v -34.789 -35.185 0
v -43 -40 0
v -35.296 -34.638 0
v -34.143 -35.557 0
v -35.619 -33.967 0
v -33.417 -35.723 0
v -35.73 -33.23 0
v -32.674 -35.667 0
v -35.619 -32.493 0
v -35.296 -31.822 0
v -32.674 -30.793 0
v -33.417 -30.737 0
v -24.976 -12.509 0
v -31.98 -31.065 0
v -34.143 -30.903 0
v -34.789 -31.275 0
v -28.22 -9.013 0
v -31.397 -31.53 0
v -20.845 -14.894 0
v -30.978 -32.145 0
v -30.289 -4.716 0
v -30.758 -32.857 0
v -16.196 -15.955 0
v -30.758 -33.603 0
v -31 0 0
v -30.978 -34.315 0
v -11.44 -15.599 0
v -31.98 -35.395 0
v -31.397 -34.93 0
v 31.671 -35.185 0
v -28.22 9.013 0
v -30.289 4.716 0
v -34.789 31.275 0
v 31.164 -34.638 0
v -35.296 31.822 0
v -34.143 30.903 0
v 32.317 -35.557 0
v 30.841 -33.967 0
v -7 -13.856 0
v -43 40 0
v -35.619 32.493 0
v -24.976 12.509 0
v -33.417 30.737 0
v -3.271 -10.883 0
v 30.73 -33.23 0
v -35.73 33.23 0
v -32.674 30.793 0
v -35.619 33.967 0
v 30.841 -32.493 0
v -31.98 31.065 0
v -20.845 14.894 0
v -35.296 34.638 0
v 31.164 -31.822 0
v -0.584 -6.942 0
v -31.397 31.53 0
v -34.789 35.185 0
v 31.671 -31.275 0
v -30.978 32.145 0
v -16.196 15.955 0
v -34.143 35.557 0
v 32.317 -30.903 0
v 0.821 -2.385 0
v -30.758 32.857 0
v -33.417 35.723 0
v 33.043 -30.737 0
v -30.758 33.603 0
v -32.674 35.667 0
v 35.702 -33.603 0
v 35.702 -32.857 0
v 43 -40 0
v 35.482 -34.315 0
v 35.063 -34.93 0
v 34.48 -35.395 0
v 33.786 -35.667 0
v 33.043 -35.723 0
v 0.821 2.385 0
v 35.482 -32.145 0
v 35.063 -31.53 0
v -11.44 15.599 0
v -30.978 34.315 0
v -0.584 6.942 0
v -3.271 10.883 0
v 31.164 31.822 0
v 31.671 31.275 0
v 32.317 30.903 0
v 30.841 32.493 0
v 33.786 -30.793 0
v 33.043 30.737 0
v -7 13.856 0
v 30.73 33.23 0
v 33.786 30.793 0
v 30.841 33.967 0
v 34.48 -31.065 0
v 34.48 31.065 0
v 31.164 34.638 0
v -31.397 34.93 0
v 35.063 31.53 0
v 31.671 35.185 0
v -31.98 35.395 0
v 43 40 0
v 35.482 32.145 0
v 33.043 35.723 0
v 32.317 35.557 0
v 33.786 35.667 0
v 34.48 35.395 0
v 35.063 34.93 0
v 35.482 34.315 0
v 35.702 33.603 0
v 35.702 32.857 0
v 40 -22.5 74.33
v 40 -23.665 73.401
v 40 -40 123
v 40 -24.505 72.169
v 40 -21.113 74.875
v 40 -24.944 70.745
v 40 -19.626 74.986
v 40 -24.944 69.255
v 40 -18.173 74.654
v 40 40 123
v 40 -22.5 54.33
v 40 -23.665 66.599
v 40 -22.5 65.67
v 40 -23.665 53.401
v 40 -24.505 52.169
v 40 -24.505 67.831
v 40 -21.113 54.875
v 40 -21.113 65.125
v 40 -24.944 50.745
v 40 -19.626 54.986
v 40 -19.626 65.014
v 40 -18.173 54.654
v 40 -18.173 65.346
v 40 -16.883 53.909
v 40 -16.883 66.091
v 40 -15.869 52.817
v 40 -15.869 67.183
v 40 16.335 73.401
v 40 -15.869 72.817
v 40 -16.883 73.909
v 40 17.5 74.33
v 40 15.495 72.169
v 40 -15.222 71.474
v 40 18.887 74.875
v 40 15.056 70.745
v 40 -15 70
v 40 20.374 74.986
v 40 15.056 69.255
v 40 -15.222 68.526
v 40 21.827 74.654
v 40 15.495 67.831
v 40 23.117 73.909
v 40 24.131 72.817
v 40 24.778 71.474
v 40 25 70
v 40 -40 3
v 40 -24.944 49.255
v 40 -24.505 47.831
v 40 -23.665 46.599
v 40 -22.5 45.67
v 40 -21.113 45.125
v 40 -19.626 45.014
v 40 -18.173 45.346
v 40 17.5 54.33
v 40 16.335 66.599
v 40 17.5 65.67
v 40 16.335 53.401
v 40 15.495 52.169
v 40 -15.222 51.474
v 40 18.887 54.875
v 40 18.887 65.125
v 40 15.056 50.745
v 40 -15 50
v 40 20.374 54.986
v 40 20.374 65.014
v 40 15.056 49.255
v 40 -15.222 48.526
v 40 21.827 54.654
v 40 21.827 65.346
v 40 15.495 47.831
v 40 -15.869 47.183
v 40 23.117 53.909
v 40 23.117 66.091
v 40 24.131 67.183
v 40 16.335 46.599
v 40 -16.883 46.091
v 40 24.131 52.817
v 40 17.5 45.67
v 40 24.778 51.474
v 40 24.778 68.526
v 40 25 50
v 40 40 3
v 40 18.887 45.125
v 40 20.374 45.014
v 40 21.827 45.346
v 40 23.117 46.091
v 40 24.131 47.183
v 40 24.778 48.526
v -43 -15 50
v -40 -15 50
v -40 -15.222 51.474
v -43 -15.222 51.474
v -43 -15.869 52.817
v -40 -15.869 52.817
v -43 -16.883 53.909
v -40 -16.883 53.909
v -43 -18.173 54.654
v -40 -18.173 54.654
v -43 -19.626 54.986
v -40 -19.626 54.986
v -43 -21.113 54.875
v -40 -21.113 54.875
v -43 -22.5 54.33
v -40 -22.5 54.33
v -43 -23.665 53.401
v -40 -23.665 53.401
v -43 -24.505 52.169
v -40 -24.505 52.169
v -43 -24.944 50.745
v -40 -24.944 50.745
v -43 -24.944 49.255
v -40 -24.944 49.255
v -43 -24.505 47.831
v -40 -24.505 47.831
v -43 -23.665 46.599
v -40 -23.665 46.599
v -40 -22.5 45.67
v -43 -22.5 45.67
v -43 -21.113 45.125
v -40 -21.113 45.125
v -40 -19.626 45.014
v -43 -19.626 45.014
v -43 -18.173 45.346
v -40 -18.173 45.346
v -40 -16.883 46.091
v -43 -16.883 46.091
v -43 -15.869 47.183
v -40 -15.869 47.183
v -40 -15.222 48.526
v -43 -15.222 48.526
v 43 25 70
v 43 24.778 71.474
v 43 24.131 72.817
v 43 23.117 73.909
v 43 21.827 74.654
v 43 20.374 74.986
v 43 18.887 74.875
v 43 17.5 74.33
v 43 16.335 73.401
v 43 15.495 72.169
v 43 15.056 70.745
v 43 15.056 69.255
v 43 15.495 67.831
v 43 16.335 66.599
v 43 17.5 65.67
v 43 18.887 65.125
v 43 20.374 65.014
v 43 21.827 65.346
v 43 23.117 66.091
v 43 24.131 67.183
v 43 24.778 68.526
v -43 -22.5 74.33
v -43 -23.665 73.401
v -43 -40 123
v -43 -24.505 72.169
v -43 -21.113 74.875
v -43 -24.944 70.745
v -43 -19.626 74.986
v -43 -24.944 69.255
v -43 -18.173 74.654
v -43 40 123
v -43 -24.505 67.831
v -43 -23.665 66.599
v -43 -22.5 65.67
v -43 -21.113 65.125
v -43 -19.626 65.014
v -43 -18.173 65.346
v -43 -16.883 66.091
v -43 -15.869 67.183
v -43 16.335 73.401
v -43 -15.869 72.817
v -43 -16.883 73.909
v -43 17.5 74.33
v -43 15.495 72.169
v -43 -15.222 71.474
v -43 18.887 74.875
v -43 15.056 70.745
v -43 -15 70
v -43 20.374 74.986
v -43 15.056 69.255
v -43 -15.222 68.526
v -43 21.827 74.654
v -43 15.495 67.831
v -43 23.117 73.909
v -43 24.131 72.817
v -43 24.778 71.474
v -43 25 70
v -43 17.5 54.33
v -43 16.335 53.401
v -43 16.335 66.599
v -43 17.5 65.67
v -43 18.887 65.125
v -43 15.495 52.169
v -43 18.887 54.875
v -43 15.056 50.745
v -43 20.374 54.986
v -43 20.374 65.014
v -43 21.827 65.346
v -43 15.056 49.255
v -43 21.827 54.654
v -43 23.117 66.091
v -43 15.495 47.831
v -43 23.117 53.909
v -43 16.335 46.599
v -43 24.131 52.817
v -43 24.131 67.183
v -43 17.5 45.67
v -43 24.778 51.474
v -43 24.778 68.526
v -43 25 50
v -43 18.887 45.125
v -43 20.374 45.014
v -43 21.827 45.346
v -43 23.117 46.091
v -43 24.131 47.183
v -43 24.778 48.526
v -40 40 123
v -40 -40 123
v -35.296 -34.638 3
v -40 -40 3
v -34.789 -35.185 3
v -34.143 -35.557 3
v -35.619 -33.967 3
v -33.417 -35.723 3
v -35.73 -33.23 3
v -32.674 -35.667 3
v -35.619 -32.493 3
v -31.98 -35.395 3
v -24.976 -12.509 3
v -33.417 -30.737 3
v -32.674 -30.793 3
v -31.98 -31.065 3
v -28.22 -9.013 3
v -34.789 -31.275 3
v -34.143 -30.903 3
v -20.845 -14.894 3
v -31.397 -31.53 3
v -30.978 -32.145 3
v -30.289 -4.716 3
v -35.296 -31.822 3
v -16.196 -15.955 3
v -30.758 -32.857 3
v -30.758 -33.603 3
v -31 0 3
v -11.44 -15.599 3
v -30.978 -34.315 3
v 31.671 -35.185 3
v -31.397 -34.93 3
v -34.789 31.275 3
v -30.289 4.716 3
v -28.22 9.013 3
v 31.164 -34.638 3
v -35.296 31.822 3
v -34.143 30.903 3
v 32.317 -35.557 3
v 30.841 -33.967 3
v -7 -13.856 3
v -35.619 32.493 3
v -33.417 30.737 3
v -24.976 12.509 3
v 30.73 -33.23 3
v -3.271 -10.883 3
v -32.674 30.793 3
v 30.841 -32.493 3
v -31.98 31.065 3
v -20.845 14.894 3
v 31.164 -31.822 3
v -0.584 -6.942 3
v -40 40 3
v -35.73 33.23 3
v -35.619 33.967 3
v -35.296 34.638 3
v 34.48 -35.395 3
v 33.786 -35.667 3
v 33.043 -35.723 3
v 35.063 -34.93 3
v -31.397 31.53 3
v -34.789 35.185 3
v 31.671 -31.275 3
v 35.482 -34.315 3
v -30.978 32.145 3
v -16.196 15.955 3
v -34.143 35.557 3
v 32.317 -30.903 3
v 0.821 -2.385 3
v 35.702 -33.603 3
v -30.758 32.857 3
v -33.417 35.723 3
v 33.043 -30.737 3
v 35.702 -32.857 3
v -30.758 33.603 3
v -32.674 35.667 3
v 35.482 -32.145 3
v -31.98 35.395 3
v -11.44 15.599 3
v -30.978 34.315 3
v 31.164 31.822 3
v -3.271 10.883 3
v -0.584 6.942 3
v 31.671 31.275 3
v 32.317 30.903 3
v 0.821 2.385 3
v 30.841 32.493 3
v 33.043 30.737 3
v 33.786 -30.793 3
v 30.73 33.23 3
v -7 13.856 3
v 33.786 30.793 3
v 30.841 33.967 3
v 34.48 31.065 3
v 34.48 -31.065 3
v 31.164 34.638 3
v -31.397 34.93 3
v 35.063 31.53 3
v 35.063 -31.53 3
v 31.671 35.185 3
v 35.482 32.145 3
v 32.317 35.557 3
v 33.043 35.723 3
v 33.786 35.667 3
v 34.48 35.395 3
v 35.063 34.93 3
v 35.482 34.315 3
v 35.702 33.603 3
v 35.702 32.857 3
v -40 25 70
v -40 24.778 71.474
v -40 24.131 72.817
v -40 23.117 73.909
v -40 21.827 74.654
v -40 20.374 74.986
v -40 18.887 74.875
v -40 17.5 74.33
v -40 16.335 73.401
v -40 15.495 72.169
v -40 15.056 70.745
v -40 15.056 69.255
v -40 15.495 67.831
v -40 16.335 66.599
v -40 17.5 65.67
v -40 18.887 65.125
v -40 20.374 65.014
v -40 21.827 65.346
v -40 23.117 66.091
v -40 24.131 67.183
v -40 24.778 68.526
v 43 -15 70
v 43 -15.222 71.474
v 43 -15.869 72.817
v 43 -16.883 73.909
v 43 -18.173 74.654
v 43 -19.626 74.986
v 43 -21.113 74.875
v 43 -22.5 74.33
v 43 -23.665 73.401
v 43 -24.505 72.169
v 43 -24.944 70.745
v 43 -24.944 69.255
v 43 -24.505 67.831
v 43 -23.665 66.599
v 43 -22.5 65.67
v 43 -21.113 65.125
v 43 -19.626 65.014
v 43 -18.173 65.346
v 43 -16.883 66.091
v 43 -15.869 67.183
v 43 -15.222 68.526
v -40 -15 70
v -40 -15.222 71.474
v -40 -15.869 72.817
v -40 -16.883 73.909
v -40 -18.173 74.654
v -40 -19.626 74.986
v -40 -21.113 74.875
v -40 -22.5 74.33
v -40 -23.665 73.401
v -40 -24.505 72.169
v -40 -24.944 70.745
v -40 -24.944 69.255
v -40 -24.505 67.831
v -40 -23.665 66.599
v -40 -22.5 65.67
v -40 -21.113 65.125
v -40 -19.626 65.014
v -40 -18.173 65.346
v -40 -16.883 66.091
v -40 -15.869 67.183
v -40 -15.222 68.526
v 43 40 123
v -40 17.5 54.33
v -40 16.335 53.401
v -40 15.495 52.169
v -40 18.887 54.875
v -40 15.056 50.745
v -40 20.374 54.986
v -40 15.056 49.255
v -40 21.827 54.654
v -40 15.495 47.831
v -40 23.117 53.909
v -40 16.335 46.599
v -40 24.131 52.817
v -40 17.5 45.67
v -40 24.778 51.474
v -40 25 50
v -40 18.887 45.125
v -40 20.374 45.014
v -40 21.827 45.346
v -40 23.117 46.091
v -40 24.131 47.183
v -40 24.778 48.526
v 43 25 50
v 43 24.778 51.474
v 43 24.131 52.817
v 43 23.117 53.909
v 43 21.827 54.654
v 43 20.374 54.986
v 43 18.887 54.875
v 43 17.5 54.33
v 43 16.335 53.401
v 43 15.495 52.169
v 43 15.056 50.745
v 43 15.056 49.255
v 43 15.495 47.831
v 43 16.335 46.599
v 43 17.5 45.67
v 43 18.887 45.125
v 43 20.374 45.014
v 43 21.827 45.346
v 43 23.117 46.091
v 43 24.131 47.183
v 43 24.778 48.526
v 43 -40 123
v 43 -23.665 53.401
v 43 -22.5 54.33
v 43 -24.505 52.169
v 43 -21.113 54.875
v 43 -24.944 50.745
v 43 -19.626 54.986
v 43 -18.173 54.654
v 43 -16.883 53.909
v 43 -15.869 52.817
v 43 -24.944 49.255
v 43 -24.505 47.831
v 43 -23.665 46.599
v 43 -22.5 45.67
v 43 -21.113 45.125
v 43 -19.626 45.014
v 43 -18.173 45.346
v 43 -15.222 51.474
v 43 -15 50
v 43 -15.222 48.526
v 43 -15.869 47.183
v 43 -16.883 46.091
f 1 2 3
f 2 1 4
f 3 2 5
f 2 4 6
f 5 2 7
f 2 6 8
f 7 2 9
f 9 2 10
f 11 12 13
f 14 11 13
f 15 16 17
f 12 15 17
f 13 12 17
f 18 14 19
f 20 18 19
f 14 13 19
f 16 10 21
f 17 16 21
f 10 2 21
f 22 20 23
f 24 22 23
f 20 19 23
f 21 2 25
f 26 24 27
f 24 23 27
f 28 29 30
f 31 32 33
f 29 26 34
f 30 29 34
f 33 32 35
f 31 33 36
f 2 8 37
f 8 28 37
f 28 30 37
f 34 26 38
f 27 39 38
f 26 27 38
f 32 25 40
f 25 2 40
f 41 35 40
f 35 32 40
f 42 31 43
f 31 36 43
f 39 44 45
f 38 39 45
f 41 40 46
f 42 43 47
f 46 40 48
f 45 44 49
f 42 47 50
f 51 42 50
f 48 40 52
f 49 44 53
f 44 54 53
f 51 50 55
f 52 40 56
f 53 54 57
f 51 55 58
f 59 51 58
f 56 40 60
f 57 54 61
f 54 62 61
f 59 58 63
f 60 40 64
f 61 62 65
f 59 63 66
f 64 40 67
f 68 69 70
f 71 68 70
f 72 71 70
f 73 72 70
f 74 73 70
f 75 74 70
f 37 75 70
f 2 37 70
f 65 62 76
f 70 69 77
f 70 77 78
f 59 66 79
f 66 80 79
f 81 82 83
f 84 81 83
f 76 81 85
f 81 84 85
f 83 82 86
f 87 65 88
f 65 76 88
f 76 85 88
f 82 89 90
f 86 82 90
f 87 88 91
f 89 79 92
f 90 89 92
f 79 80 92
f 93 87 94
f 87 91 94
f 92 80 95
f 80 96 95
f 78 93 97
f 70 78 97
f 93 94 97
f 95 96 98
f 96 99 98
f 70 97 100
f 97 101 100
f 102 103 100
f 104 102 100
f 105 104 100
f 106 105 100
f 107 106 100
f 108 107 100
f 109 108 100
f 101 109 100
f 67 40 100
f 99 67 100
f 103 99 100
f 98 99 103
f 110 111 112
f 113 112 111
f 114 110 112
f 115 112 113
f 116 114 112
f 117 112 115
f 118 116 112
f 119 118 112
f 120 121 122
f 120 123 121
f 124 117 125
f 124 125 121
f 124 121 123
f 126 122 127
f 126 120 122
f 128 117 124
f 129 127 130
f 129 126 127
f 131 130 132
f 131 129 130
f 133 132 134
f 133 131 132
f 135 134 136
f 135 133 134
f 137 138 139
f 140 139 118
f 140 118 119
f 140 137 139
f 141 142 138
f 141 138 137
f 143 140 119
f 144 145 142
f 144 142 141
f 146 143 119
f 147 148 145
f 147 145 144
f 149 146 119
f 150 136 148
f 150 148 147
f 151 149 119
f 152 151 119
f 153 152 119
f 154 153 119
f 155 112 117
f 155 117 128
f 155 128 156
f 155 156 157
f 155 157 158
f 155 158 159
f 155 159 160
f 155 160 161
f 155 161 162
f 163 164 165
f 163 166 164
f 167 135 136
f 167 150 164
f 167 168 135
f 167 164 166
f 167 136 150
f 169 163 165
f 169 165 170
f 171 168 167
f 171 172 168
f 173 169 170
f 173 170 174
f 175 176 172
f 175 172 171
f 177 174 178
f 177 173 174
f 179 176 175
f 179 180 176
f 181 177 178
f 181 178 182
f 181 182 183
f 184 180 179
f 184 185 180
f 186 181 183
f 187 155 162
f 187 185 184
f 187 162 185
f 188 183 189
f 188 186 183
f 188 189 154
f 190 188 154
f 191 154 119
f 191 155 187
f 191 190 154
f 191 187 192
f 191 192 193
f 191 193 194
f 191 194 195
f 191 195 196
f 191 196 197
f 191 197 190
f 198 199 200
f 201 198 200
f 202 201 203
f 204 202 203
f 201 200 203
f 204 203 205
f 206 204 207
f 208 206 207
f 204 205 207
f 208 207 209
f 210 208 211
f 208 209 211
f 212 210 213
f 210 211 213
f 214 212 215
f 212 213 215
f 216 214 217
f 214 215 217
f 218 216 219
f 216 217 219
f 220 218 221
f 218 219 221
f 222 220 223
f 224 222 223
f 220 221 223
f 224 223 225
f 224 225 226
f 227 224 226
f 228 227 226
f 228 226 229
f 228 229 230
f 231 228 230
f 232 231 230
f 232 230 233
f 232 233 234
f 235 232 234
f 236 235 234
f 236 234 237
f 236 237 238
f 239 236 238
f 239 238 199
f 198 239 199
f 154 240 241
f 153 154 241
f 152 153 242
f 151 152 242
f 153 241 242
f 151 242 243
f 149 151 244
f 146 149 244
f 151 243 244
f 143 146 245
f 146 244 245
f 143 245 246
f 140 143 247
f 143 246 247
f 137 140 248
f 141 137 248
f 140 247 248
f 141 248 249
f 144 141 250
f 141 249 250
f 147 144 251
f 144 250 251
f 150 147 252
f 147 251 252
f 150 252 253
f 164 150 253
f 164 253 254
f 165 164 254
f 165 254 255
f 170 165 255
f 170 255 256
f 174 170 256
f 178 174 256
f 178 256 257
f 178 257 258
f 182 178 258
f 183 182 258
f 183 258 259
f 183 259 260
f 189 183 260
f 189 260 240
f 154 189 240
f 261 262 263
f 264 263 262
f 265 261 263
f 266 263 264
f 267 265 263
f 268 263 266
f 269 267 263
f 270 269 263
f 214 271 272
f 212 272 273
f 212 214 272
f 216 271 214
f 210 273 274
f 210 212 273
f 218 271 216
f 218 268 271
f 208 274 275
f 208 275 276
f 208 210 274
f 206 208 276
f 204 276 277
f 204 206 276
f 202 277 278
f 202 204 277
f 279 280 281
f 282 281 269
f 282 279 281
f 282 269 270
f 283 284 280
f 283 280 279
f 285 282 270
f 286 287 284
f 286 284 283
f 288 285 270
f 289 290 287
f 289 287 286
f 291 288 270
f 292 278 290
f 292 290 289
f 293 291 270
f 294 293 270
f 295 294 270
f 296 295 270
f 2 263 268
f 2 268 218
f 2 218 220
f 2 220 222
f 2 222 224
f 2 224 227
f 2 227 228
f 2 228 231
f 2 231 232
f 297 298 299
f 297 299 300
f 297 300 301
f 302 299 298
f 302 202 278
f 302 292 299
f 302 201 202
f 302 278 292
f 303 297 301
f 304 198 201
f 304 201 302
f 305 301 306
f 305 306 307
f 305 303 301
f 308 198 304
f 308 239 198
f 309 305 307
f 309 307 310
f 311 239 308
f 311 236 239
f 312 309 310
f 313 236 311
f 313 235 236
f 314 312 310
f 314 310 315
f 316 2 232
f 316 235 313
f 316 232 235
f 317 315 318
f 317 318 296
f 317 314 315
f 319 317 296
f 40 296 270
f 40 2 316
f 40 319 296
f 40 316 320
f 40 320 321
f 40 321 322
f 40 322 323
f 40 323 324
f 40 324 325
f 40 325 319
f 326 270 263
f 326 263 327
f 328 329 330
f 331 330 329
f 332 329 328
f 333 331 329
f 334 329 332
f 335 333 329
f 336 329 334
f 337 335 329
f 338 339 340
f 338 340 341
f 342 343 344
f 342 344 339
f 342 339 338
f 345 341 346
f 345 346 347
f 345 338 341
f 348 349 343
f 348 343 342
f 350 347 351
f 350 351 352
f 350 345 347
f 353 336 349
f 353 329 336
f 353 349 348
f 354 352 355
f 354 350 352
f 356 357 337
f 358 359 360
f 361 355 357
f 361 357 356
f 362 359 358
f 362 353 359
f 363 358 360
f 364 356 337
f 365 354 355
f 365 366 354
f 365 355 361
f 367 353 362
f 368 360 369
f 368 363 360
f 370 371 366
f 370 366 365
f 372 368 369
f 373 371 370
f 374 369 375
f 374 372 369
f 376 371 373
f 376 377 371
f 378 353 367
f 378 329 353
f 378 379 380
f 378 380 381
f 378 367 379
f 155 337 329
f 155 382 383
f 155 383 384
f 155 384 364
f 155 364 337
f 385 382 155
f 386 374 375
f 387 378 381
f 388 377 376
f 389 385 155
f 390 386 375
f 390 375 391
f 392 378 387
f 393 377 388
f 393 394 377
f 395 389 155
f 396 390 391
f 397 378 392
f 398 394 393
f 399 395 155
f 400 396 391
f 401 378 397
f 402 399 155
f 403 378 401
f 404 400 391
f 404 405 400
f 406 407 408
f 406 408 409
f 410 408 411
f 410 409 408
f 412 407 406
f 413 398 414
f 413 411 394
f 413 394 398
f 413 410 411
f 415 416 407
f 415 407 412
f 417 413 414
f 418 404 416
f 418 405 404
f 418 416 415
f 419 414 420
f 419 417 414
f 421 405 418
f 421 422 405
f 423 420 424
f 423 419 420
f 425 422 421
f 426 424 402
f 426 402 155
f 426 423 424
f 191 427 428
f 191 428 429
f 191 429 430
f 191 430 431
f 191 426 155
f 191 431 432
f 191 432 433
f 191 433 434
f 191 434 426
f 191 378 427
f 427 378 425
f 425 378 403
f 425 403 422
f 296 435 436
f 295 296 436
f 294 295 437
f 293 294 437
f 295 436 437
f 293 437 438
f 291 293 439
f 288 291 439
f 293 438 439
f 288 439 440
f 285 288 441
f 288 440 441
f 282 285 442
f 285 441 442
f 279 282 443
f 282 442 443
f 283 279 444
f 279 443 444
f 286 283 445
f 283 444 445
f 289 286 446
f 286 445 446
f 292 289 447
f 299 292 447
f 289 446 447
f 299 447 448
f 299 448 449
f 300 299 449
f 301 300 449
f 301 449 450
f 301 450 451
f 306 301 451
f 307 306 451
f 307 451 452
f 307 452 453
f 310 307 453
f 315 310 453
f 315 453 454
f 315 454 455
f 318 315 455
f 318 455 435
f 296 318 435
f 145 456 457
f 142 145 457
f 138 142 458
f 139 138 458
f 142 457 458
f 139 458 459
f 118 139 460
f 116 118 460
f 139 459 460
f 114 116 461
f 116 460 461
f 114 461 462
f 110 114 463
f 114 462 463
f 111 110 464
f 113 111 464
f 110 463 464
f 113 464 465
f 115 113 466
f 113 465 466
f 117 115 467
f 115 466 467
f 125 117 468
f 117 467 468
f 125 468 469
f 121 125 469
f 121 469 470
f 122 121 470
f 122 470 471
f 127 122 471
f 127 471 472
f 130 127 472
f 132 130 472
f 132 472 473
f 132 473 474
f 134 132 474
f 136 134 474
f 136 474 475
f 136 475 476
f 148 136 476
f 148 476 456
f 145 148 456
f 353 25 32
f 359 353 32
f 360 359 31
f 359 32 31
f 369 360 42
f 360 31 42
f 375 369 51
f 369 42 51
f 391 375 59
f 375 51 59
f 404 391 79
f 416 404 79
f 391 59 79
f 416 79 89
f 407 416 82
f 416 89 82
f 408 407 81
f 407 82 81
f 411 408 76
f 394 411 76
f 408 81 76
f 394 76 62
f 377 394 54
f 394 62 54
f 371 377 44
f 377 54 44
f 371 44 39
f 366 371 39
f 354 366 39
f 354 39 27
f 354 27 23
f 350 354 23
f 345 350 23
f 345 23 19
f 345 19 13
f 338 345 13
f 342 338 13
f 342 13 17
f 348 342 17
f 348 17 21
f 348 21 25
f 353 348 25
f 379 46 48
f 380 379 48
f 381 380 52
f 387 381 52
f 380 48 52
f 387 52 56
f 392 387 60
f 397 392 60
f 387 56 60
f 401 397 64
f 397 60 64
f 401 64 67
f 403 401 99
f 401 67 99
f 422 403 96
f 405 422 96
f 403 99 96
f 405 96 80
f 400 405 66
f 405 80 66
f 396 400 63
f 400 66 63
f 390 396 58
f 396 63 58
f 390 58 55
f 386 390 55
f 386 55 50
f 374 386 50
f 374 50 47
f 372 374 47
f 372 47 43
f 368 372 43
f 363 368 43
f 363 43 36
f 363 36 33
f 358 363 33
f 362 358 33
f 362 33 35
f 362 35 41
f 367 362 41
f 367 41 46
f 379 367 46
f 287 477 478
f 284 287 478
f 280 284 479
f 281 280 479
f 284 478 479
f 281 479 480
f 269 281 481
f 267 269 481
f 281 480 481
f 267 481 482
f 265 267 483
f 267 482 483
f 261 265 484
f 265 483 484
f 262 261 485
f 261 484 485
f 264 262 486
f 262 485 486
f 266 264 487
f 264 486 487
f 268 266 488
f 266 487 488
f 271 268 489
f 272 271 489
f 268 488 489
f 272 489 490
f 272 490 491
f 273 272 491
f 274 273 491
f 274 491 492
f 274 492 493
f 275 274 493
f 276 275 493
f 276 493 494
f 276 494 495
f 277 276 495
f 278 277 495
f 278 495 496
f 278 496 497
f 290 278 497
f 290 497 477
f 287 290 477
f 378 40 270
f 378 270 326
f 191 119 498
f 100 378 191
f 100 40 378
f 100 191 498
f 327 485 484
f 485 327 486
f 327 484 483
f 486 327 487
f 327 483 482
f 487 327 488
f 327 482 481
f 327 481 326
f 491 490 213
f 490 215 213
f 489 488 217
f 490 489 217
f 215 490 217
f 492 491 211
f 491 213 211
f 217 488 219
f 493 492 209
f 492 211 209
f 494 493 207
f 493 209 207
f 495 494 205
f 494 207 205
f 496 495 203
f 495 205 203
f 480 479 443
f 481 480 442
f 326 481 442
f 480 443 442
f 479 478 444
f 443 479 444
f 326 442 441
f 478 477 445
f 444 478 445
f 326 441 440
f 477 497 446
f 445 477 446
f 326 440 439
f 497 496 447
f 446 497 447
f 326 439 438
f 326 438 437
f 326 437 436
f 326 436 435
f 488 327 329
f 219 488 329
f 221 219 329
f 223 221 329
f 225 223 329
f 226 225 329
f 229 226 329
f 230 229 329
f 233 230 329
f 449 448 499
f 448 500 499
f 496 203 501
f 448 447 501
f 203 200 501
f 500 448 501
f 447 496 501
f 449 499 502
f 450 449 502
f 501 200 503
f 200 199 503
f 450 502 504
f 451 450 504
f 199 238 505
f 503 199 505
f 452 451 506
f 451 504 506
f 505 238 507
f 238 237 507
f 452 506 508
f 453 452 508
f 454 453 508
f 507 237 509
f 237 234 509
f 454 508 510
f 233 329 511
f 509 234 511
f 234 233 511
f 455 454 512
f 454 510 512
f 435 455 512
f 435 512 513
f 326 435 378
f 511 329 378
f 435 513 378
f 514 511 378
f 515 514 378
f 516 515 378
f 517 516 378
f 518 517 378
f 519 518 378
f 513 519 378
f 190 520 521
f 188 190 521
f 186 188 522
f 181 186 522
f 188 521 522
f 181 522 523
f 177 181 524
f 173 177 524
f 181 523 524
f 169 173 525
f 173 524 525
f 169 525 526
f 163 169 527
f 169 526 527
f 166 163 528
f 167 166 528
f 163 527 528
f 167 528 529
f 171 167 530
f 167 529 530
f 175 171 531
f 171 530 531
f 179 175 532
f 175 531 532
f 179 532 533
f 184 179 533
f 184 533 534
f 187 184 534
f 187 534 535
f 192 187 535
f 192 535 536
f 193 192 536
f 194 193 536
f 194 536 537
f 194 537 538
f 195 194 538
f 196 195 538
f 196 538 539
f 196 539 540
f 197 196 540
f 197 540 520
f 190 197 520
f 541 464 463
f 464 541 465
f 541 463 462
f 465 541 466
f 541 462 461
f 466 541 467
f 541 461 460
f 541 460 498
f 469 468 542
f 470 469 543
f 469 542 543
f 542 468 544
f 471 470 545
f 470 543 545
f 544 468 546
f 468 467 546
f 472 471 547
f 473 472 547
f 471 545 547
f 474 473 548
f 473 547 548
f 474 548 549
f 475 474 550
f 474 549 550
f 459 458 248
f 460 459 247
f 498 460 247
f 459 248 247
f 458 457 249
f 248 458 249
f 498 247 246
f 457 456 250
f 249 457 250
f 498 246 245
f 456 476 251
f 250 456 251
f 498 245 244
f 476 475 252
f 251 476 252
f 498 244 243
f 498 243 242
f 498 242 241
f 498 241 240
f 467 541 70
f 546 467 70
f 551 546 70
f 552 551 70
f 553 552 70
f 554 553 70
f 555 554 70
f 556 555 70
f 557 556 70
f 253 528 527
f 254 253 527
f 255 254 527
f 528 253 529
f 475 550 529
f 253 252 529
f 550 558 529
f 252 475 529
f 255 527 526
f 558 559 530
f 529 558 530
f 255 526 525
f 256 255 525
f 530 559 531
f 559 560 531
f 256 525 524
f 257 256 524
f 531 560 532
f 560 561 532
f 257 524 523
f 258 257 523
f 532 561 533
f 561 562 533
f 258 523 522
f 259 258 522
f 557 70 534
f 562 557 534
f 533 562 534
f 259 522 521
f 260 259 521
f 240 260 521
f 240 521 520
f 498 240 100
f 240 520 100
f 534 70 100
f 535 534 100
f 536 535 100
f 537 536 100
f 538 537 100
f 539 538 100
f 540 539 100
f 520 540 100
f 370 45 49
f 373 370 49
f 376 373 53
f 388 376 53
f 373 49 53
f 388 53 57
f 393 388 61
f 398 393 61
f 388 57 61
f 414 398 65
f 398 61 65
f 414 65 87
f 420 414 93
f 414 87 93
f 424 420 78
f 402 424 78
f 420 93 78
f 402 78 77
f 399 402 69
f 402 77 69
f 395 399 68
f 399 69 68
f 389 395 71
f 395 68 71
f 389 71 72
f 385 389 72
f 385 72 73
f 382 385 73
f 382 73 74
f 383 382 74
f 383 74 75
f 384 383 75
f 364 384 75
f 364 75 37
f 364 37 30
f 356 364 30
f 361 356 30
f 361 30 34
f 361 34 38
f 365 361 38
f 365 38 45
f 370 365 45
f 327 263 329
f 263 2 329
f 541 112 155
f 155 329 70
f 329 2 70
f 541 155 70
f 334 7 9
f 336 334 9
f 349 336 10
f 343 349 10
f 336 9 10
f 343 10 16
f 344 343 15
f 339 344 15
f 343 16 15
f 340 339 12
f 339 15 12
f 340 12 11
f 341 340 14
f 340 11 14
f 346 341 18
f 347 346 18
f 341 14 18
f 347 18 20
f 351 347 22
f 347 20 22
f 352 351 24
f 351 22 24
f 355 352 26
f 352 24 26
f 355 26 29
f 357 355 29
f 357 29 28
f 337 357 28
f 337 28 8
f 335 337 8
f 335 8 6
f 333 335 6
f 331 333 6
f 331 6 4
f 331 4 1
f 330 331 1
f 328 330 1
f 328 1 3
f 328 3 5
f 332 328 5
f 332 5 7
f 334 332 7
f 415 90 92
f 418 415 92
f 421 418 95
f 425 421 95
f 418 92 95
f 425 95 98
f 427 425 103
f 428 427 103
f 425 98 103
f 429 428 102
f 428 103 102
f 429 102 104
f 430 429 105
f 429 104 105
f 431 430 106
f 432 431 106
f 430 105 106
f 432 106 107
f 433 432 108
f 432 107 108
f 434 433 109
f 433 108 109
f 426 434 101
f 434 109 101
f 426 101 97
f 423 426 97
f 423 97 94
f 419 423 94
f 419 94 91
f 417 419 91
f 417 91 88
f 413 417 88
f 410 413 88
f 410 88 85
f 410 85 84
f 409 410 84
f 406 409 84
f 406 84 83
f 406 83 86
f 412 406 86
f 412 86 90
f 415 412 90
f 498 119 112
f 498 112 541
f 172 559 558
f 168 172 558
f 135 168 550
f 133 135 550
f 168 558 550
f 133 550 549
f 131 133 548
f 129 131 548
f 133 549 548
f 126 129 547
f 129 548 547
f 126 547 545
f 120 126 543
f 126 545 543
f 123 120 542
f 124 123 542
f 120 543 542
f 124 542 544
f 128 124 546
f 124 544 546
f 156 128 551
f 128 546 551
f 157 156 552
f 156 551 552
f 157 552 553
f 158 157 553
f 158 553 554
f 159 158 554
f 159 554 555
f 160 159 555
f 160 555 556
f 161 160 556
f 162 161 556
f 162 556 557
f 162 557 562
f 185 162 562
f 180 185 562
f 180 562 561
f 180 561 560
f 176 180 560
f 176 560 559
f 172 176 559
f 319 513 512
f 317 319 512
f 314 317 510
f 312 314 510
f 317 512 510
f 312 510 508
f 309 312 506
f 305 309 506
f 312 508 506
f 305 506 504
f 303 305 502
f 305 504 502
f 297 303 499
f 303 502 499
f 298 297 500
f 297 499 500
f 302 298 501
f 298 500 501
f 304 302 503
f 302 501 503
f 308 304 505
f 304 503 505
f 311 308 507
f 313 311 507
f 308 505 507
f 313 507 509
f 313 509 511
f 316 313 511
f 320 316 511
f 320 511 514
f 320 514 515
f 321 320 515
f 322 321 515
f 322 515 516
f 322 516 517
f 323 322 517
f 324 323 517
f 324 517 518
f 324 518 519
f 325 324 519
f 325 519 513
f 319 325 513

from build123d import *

# Parameters (mm, degrees)
SKETCH1_W           = 86
SKETCH1_H           = 80
BOSS_EXTRUDE1_DEPTH = 3
SKETCH2_W           = 3
SKETCH2_H           = 80
BOSS_EXTRUDE2_DEPTH = 120
SKETCH3_R           = 16
CUT_EXTRUDE1_DEPTH  = 120
SKETCH4_R           = 2.5
CUT_EXTRUDE2_DEPTH  = 120
SKETCH5_R           = 5
CUT_EXTRUDE3_DEPTH  = 156.32224567


with BuildPart() as part:
    # Sketch1 → Boss-Extrude1 (new body)
    with BuildSketch(Plane.XY):
        Rectangle(SKETCH1_W, SKETCH1_H)
    extrude(amount=BOSS_EXTRUDE1_DEPTH)

    # Sketch2 → Boss-Extrude2 (add)
    with BuildSketch(Plane.XY.offset(3)):
        with Locations((-41.5, 0)):
            Rectangle(SKETCH2_W, SKETCH2_H)
        with Locations((41.5, 0)):
            Rectangle(SKETCH2_W, SKETCH2_H)
    extrude(amount=BOSS_EXTRUDE2_DEPTH)

    # Sketch3 → Cut-Extrude1 (cut)
    with BuildSketch(Plane(origin=(0, 0, 0), x_dir=(-1, 0, 0), z_dir=(0, 0, -1))):
        with Locations((15, 0)):
            Circle(SKETCH3_R)
    extrude(amount=-CUT_EXTRUDE1_DEPTH, mode=Mode.SUBTRACT)

    # Sketch4 → Cut-Extrude2 (cut)
    with BuildSketch(Plane(origin=(0, 0, 0), x_dir=(-1, 0, 0), z_dir=(0, 0, -1))):
        with Locations((-33.23, 33.23)):
            Circle(SKETCH4_R)
        with Locations((-33.23, -33.23)):
            Circle(SKETCH4_R)
        with Locations((33.23, -33.23)):
            Circle(SKETCH4_R)
        with Locations((33.23, 33.23)):
            Circle(SKETCH4_R)
    extrude(amount=-CUT_EXTRUDE2_DEPTH, mode=Mode.SUBTRACT)

    # Sketch5 → Cut-Extrude3 (cut, through all)
    with BuildSketch(Plane(origin=(43, 0, 0), x_dir=(0, 0, -1), z_dir=(1, 0, 0))):
        with Locations(Location((-50, 20, 0), (0, 0, 90))):
            Circle(SKETCH5_R)
        with Locations(Location((-50, -20, 0), (0, 0, 90))):
            Circle(SKETCH5_R)
        with Locations(Location((-70, 20, 0), (0, 0, 90))):
            Circle(SKETCH5_R)
        with Locations(Location((-70, -20, 0), (0, 0, 90))):
            Circle(SKETCH5_R)
    extrude(amount=-CUT_EXTRUDE3_DEPTH, mode=Mode.SUBTRACT)


solid = part.part
